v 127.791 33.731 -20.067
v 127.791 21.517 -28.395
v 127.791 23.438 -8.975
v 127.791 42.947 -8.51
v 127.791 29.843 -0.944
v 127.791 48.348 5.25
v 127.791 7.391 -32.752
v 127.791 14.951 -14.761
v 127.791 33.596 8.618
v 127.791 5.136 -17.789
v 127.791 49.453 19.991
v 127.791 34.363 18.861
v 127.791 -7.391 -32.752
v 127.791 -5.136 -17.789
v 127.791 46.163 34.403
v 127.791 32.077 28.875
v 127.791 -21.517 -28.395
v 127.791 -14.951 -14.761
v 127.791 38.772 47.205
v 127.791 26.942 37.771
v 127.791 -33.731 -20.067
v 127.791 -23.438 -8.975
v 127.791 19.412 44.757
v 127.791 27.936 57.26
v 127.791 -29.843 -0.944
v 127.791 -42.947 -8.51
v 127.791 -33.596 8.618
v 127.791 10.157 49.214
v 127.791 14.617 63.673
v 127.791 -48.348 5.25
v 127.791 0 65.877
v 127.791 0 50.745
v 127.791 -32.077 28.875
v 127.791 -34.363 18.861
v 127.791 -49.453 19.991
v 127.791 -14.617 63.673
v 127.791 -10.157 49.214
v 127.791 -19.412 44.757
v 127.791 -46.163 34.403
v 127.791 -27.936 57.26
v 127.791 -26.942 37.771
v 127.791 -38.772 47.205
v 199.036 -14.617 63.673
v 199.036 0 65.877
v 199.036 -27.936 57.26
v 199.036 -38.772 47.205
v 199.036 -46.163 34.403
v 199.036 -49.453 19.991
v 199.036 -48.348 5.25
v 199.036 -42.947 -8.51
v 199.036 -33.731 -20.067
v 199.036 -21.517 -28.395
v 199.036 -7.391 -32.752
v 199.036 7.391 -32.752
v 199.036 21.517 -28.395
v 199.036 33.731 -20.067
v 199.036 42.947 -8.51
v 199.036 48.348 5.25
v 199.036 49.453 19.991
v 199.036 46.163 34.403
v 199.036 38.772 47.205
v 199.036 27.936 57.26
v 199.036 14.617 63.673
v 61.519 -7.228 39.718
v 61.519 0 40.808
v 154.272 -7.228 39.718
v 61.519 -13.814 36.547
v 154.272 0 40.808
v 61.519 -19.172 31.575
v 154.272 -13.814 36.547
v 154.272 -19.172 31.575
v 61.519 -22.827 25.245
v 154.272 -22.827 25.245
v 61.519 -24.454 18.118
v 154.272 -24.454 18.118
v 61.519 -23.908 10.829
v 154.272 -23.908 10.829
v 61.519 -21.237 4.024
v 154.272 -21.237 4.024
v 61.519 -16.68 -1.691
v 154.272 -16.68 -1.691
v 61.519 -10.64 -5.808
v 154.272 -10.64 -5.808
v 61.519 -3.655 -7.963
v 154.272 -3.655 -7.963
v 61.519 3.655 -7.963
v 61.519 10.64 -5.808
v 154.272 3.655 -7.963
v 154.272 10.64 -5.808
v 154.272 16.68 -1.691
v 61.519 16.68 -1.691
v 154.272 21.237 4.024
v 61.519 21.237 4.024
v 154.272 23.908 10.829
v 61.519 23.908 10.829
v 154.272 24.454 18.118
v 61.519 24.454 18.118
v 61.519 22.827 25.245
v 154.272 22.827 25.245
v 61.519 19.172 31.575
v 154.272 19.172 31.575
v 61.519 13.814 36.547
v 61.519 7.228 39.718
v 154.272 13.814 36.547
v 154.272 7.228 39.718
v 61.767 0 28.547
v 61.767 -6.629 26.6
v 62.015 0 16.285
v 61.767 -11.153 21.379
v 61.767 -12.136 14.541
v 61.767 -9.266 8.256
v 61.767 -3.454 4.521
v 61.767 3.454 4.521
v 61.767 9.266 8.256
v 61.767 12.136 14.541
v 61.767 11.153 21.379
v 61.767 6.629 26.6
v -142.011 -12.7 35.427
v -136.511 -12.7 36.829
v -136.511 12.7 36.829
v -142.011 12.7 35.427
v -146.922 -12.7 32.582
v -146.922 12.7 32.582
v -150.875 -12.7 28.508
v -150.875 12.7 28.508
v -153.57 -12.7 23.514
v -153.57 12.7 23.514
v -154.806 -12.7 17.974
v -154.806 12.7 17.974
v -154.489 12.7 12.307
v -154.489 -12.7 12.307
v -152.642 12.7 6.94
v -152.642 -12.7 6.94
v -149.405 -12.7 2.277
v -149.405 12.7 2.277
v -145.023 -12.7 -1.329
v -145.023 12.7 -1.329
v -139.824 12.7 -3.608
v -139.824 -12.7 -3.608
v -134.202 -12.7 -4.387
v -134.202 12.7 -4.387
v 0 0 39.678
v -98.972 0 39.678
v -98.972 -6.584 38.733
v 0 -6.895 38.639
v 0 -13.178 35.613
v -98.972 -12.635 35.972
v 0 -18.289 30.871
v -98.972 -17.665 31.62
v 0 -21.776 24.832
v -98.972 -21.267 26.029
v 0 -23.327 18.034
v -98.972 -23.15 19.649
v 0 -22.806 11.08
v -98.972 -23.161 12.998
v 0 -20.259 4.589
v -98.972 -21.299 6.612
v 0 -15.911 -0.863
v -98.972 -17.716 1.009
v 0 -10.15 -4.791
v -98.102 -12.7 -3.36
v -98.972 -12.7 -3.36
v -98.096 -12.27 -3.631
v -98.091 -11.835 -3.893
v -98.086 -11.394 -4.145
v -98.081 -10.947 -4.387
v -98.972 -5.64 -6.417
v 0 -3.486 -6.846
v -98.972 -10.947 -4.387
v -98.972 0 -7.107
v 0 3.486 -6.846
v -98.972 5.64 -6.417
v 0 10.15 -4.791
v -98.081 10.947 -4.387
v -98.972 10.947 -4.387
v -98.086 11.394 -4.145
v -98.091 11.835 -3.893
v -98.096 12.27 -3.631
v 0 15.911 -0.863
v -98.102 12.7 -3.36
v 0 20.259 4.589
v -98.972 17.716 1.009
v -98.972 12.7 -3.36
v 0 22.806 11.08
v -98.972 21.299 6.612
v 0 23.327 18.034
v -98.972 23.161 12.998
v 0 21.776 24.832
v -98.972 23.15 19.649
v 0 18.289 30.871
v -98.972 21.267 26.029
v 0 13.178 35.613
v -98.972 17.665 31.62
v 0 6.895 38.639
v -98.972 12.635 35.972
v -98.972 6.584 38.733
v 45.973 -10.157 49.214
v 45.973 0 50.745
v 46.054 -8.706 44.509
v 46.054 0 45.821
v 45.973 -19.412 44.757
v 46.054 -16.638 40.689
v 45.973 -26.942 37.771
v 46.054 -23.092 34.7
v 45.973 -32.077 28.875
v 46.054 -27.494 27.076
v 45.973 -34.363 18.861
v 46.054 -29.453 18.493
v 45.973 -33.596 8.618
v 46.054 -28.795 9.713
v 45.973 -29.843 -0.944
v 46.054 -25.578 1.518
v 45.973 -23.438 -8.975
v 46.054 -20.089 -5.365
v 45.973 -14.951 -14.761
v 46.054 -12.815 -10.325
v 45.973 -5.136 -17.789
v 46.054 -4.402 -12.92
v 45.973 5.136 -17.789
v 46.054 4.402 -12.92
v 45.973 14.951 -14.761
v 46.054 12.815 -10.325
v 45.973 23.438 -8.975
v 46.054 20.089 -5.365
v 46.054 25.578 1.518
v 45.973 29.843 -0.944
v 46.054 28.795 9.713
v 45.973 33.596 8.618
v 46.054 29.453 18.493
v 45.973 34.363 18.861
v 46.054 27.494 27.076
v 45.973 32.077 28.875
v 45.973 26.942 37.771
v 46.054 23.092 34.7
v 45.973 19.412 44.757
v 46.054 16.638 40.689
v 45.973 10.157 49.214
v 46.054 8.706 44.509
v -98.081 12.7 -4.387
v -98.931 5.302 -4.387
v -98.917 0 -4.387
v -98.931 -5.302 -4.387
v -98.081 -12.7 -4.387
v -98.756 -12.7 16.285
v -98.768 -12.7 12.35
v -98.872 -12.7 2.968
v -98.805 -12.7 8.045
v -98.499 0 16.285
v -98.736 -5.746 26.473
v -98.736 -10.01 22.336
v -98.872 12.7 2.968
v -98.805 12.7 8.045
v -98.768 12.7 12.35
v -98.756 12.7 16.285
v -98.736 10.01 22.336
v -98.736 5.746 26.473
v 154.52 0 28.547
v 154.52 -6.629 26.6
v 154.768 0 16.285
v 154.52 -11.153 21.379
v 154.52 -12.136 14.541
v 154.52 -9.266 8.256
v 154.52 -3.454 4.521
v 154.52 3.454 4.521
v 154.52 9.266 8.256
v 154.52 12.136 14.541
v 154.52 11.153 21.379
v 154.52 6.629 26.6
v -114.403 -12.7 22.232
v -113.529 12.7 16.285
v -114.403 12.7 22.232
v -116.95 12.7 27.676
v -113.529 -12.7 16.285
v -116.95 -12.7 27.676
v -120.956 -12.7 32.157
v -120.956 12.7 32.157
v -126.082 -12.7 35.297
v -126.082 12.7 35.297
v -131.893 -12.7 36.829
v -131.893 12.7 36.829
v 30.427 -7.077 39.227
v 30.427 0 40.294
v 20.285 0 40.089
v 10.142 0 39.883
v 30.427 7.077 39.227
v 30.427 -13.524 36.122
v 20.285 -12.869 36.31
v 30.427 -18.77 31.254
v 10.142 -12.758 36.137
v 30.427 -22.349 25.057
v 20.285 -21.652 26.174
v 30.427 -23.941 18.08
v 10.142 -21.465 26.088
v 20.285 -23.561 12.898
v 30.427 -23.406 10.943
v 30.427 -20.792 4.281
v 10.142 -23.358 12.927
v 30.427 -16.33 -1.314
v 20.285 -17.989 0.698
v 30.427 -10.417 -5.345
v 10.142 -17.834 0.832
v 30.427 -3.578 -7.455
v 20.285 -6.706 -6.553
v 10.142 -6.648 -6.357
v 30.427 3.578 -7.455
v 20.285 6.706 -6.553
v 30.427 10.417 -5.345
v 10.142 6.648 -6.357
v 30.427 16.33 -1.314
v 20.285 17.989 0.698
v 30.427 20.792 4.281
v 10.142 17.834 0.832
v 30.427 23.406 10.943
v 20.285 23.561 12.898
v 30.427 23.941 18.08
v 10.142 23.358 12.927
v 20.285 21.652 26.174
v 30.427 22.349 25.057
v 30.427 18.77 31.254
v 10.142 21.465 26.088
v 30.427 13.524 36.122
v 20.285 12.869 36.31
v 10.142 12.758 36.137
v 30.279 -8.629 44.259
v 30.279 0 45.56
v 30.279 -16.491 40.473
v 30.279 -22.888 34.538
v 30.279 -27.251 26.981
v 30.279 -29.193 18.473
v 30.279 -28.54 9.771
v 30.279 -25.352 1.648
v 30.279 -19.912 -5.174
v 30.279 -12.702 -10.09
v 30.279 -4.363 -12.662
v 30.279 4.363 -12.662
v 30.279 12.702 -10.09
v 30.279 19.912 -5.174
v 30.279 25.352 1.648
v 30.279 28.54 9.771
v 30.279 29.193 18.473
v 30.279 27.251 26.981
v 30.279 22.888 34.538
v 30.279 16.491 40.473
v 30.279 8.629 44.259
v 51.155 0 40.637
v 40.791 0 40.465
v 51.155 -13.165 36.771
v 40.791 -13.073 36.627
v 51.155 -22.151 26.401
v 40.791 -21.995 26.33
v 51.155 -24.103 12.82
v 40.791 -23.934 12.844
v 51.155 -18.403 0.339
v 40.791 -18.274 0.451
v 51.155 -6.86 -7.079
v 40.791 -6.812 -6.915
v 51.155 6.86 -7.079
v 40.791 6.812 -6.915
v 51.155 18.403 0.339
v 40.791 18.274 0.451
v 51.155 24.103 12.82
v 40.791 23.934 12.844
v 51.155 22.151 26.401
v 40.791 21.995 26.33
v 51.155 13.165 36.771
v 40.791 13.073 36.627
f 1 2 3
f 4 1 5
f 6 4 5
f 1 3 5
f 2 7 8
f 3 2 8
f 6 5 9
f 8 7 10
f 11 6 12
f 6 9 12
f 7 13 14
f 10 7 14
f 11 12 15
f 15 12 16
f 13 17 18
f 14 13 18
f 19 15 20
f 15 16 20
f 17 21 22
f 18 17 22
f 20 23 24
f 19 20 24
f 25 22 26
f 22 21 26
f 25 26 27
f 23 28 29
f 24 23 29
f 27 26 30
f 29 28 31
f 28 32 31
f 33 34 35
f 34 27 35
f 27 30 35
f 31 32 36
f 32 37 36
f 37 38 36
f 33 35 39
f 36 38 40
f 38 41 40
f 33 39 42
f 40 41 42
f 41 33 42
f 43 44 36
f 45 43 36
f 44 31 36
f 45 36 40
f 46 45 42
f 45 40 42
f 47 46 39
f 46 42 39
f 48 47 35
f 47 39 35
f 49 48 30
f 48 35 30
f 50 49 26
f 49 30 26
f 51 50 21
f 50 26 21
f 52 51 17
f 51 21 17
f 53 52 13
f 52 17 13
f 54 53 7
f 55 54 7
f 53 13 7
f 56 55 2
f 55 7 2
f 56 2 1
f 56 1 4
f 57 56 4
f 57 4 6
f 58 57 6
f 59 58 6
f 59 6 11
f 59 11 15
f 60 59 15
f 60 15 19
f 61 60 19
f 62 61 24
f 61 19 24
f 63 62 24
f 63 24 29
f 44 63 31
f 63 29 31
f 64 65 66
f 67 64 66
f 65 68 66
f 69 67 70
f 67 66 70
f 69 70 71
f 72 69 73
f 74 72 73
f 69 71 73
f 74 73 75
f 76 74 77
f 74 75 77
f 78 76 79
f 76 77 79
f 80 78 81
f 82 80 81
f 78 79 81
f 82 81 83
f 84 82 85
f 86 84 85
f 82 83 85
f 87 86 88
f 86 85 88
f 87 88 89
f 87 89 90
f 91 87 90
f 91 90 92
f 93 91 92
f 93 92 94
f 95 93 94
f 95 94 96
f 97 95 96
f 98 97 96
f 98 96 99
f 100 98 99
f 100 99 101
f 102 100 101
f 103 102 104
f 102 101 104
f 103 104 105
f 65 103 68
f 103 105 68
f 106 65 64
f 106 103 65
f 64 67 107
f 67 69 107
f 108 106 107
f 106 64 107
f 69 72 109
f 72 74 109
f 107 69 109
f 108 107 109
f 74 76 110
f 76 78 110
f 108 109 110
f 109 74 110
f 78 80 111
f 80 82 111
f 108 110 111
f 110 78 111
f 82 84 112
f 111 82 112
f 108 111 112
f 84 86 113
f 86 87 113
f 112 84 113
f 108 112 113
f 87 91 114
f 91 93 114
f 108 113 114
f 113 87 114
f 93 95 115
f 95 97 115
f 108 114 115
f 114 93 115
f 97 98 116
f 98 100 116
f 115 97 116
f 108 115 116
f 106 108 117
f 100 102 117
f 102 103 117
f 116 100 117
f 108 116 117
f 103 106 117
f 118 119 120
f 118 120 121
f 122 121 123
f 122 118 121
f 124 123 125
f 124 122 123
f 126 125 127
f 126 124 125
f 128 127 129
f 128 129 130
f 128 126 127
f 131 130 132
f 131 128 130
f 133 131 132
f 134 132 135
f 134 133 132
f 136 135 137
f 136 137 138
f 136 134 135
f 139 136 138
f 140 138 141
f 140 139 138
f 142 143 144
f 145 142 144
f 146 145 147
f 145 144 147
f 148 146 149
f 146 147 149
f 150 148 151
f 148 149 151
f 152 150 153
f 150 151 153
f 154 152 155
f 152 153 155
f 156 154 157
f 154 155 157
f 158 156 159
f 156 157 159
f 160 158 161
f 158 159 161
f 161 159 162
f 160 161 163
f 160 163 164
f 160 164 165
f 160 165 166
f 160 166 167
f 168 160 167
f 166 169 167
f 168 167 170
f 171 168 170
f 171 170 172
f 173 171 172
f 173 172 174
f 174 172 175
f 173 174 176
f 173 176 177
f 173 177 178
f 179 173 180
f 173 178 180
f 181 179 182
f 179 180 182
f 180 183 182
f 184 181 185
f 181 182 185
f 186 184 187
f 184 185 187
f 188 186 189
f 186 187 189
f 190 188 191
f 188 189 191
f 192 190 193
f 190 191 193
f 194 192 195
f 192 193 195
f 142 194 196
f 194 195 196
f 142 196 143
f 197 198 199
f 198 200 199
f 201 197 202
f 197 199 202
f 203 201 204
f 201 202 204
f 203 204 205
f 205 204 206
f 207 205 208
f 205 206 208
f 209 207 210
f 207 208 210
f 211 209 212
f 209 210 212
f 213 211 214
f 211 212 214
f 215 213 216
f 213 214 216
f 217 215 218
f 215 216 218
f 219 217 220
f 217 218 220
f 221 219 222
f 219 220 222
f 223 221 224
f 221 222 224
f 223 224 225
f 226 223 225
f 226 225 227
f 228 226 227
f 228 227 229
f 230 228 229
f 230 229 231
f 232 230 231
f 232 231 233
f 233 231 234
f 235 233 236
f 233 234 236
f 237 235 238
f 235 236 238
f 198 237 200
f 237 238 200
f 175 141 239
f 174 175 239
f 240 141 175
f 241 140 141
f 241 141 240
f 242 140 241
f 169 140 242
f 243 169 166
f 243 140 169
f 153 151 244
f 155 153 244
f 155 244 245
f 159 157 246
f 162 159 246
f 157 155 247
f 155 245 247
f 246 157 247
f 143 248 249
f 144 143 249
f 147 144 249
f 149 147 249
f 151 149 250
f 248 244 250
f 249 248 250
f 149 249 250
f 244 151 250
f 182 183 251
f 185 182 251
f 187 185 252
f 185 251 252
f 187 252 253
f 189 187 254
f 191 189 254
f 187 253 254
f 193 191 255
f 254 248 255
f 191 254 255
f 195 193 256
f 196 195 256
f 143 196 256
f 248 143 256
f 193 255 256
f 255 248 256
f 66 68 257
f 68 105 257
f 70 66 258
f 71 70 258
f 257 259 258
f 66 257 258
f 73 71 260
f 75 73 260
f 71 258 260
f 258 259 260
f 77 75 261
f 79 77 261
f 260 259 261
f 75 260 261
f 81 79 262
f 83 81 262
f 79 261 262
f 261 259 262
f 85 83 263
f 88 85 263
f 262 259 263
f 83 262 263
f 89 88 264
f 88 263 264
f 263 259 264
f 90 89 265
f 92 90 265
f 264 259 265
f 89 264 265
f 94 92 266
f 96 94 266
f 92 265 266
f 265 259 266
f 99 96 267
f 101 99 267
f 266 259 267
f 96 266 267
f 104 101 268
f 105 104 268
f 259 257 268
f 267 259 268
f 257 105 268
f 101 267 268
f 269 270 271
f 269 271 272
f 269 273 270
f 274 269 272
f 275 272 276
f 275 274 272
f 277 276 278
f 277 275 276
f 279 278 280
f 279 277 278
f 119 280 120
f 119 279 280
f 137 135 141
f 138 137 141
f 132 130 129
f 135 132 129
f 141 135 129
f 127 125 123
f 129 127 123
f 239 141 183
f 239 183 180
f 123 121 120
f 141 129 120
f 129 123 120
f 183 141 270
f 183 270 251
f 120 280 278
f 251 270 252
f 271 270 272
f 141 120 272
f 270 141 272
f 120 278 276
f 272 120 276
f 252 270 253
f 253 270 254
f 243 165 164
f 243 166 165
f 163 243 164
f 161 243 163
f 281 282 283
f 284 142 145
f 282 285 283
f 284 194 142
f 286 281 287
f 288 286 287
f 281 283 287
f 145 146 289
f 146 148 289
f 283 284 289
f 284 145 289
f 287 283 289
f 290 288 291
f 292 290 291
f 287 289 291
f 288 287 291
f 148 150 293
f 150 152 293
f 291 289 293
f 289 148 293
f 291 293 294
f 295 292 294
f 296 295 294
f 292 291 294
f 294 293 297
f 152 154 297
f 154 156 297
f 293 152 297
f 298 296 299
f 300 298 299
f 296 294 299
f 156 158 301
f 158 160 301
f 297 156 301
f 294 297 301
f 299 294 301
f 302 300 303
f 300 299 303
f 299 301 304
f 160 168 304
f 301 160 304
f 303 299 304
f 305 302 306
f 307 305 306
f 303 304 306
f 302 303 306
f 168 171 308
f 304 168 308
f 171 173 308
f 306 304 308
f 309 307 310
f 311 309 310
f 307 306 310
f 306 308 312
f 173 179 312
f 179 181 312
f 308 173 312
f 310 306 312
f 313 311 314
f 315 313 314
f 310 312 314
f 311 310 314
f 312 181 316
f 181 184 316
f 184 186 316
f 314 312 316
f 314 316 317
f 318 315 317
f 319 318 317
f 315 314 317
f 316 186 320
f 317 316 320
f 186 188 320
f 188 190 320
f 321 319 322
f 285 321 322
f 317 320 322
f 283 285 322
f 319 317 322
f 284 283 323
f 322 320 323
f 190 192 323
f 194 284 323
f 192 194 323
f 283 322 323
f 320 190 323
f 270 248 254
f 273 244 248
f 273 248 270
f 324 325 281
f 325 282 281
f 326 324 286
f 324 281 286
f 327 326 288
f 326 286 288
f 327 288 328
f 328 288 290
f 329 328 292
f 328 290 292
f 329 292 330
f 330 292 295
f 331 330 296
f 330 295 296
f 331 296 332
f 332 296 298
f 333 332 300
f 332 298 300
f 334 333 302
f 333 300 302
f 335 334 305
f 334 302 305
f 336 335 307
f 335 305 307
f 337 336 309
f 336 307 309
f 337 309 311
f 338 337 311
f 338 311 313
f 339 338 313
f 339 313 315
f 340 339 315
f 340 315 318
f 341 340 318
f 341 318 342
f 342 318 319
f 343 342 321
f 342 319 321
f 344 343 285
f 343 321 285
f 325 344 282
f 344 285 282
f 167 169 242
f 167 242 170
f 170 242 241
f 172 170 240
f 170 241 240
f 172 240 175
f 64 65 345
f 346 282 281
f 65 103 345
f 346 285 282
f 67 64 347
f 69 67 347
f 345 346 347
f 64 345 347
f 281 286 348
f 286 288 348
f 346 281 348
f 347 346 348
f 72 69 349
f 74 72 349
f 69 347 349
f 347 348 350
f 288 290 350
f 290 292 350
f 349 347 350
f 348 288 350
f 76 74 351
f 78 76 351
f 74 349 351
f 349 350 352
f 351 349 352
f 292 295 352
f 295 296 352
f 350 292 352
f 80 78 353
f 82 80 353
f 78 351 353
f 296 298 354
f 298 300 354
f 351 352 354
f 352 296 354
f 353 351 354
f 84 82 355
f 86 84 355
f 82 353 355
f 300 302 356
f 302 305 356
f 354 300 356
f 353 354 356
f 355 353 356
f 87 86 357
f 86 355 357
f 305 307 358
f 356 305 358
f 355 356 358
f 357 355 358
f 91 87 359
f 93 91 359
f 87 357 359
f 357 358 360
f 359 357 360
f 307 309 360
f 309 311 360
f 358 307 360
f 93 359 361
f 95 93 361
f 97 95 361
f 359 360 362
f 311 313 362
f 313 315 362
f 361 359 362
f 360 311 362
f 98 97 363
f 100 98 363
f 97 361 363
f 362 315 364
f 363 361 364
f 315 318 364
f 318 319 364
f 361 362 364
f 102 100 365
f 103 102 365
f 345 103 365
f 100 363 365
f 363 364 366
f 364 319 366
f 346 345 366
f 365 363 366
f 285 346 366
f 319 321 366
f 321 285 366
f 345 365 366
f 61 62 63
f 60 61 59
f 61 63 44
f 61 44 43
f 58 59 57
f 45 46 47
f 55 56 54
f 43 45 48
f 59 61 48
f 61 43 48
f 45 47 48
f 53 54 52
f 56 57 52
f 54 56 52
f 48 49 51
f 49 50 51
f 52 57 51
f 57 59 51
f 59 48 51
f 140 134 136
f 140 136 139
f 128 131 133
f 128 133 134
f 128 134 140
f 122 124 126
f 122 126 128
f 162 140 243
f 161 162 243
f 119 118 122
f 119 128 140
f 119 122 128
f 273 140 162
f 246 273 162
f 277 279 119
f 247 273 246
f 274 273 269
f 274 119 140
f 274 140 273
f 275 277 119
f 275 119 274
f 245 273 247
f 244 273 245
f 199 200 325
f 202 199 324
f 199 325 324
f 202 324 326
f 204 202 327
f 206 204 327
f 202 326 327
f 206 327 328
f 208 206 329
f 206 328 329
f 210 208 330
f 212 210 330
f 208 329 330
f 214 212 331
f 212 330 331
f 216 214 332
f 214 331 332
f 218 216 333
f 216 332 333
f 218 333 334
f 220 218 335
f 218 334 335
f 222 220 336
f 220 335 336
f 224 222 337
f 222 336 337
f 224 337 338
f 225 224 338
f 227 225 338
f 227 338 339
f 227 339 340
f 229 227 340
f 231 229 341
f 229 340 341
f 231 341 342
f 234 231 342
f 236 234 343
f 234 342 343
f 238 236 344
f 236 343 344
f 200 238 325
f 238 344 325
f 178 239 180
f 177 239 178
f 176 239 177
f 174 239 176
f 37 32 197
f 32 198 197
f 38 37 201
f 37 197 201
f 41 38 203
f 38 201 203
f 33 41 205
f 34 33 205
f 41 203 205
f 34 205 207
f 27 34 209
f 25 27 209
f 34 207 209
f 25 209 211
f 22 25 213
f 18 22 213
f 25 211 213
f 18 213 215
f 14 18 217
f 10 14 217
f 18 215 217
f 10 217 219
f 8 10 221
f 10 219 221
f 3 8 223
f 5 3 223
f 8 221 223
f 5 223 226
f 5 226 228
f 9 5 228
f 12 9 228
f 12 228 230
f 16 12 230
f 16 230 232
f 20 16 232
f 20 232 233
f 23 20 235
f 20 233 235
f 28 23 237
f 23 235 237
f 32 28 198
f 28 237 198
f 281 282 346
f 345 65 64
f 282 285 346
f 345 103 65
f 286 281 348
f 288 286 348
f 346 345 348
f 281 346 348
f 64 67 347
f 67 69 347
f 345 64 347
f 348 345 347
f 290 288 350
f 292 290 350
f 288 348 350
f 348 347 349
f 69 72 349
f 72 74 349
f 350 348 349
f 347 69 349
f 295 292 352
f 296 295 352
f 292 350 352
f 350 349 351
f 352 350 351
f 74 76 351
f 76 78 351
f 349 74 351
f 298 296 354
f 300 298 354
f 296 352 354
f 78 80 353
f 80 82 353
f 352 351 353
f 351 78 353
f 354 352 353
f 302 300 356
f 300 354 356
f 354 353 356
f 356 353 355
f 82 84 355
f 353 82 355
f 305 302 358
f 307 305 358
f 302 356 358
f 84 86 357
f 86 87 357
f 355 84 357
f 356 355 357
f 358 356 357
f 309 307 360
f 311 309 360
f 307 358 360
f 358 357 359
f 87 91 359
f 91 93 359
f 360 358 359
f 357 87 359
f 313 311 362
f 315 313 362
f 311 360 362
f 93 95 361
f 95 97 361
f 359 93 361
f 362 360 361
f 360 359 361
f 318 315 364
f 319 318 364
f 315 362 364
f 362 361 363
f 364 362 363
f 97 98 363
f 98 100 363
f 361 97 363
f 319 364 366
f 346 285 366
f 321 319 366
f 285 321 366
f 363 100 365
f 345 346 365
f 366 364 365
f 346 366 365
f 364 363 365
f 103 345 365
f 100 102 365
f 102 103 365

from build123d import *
from build123d import SkipClean  # not in build123d's __all__

# Parameters (mm, degrees)
F3_DEPTH = 12.7


with BuildPart() as f1:
    # F0 (on Front) → F1 (revolve)
    with BuildSketch(Plane.XZ):
        Polygon((30.2789051418, 45.5598932677), (30.4273499666, 40.2938460652), (61.5186302682, 40.8079418176), (154.2716920376, 40.8079418176), (154.7678885906, 16.2854908297), (199.0363299847, 16.2854908297), (199.0363299847, 36.9584394366), (199.0363299847, 65.8766925335), (127.791211009, 65.8766925335), (127.791211009, 50.7449842989), (45.9729901174, 50.7449842989), (46.0544126905, 45.8207420119), align=None)
    revolve(axis=Axis((-33.7930093709, 0, 16.2854908297), (1, 0, 0)))


with BuildPart() as f2:
    # F0 (on Front) → F2 (revolve)
    with BuildSketch(Plane.XZ):
        Polygon((-98.9724991263, 39.6781675518), (-98.4991628533, 16.2854908297), (30.9131441116, 16.2854908297), (30.4273499666, 40.2938460652), (0, 39.6781675518), align=None)
        Polygon((30.4273499666, 40.2938460652), (30.9131441116, 16.2854908297), (62.0148268213, 16.2854908297), (61.5186302682, 40.8079418176), align=None)
    revolve(axis=Axis((-33.7930093709, 0, 16.2854908297), (1, 0, 0)))

    # F0 (on Front) → F3 (join, symmetric)
    with BuildSketch(Plane.XZ):
        with BuildLine():
            Line((-131.8934512444, 36.8291237046), (-136.5107891798, 36.8291237046))
            ThreePointArc((-136.5107891798, 36.8291237046), (-154.8427145679, 15.1293469199), (-134.2021202121, -4.3874577771))
            ThreePointArc((-134.2021202121, -4.3874577771), (-119.5841380651, 1.6675086827), (-113.5291716052, 16.2854908297))
            ThreePointArc((-113.5291716052, 16.2854908297), (-118.7894987767, 30.0630778678), (-131.8934512444, 36.8291237046))
        make_face()
        with BuildLine():
            ThreePointArc((-113.5291716052, 16.2854908297), (-119.5841380651, 1.6675086827), (-134.2021202121, -4.3874577771))
            Line((-134.2021202121, -4.3874577771), (-98.0808585882, -4.3874577771))
            Line((-98.0808585882, -4.3874577771), (-98.4991628533, 16.2854908297))
            Line((-98.4991628533, 16.2854908297), (-113.5291716052, 16.2854908297))
        make_face()
    with SkipClean():  # cleaning this boolean's faces spoils the solid; the shape is the same uncleaned
        extrude(amount=F3_DEPTH, both=True)


solid = Compound([f1.part, f2.part])
